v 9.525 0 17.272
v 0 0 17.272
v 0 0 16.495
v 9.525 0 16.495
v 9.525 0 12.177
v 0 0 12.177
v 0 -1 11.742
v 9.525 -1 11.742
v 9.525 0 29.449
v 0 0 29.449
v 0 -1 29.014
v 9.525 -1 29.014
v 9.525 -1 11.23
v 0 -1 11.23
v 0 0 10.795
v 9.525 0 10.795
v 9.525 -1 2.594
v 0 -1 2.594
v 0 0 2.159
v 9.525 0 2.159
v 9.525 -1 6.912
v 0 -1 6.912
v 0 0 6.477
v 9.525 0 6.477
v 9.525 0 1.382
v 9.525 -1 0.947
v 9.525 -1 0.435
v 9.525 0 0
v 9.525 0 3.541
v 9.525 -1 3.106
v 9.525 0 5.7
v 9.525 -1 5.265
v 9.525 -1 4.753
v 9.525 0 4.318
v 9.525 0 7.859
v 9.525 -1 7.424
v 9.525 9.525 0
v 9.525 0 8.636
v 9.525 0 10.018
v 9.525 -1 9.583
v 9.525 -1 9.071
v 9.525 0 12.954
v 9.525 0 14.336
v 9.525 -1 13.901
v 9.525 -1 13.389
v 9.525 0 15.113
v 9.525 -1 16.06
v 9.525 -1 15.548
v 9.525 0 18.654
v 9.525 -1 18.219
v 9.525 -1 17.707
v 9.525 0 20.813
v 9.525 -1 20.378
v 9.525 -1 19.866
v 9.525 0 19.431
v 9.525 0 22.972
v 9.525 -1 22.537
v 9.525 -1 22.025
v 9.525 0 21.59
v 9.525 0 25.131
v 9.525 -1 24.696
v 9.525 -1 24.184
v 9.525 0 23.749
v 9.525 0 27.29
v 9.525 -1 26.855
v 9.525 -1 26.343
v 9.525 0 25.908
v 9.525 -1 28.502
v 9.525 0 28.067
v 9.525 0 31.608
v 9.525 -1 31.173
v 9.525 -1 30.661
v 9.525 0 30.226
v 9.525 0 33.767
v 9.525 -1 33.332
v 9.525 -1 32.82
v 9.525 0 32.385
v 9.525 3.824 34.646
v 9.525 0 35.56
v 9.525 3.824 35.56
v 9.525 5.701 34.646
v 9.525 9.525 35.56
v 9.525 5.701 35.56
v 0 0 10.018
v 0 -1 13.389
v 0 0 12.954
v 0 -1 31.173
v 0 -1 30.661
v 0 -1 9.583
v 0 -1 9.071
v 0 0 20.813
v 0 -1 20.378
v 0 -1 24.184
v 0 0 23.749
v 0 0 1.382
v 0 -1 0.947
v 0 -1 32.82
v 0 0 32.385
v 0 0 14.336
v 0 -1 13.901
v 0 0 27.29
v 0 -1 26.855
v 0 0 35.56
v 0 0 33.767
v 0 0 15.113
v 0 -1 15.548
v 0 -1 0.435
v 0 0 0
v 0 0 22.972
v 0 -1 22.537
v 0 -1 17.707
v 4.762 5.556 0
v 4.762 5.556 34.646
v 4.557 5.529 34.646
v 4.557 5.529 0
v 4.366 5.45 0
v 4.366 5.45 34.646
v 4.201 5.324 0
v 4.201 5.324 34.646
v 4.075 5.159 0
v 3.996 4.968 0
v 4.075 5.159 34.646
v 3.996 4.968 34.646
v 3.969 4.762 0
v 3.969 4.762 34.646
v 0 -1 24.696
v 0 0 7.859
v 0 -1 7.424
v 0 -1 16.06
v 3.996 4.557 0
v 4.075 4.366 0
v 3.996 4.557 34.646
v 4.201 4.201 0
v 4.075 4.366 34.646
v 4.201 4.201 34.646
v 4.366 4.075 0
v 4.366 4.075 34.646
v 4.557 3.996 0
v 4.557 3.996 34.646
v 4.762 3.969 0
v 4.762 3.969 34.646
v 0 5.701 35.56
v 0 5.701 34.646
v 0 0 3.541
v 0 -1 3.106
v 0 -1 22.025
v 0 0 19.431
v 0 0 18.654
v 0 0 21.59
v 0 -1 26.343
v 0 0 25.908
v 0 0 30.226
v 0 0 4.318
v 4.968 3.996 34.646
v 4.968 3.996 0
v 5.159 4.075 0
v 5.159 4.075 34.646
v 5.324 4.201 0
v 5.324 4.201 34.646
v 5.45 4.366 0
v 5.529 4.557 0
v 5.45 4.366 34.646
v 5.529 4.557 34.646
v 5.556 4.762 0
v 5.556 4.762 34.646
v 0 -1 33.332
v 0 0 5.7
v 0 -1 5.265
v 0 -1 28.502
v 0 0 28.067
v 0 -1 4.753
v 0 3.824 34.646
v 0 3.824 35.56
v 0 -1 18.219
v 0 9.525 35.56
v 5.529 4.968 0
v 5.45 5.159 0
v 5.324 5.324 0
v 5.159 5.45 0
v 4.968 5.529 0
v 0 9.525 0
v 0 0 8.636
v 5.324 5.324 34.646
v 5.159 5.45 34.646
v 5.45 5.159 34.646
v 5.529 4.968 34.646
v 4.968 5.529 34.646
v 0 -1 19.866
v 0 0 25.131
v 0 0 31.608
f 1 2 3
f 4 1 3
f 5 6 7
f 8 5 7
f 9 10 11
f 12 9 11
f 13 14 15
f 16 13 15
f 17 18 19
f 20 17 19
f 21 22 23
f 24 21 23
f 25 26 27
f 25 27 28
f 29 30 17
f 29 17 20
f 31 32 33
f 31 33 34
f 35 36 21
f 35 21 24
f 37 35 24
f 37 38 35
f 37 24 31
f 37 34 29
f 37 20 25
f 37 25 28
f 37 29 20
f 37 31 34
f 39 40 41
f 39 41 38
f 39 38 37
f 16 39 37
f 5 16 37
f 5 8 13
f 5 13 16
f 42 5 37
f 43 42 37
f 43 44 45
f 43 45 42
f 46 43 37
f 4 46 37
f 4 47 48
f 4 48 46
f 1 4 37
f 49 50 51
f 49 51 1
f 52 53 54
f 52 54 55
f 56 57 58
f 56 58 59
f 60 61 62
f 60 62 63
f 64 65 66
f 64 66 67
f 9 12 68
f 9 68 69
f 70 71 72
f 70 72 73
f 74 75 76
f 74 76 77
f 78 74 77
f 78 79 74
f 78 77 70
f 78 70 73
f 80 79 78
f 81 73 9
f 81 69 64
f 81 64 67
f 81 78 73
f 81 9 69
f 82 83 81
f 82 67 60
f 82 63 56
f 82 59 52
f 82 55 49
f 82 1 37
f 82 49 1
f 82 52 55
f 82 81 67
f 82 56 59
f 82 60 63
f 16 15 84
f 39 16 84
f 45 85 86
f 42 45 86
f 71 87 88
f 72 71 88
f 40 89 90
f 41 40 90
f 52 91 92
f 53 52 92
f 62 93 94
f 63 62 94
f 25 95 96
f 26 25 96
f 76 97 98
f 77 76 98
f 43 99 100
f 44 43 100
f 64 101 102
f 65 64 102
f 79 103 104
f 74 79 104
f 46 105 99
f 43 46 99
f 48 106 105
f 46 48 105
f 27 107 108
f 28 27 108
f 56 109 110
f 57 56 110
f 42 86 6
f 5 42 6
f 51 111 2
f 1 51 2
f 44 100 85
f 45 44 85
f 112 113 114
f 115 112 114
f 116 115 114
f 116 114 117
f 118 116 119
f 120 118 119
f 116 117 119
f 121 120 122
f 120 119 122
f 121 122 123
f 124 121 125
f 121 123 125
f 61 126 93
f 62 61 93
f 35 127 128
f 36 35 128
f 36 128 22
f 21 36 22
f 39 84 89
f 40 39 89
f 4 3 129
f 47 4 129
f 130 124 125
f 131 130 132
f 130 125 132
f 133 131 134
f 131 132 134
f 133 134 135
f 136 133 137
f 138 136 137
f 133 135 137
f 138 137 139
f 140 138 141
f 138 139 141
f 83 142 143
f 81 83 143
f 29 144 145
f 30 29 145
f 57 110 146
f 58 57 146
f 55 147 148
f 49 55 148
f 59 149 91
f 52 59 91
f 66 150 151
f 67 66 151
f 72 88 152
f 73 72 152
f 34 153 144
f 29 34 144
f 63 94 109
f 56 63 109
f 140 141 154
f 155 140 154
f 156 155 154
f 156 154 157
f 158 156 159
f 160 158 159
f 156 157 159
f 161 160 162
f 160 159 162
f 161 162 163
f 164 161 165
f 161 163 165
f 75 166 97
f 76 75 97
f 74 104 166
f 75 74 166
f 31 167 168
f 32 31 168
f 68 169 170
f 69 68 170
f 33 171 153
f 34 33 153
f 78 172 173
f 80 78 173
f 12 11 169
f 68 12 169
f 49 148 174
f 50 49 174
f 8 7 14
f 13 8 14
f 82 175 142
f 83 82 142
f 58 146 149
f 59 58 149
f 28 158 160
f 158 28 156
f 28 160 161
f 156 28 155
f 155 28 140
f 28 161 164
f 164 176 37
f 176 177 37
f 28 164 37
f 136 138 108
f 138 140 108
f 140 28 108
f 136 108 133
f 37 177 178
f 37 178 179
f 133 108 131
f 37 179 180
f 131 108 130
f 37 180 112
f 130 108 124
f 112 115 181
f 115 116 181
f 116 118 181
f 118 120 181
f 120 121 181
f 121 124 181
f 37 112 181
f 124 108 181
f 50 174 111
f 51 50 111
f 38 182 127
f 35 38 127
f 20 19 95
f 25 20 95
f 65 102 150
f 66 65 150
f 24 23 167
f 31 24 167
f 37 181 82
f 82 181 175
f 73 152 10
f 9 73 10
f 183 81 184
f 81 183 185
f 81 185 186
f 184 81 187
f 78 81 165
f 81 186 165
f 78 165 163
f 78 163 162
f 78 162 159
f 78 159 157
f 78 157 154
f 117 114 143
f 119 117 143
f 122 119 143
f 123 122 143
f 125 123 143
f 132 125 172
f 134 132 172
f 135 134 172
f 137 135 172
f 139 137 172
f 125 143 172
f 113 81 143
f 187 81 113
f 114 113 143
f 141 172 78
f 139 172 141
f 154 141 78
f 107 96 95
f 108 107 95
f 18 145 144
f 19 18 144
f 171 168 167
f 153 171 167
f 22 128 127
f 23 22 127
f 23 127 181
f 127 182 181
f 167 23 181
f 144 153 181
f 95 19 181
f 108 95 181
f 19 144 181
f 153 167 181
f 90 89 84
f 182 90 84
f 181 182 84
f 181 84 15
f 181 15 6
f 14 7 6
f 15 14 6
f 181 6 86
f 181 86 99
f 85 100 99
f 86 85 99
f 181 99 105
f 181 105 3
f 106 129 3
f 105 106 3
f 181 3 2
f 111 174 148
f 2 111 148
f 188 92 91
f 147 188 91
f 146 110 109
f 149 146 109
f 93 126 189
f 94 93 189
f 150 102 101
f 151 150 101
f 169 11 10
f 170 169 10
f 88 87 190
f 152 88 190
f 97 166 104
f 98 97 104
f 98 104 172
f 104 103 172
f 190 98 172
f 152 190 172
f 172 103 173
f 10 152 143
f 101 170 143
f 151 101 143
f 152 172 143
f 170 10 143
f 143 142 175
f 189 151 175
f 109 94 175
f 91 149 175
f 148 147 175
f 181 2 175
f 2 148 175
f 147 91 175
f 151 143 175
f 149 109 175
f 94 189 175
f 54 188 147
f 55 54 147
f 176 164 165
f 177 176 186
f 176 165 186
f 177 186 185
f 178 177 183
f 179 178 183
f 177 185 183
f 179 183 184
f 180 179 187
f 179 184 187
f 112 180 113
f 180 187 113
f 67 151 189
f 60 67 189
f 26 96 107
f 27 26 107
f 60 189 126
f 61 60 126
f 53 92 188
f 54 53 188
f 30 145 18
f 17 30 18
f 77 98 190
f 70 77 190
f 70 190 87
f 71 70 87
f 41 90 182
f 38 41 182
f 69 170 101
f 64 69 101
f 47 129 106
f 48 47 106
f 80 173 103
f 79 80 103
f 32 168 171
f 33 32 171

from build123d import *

# Parameters (mm, degrees)
F1_DEPTH = 9.525
F3_DEPTH = 34.6458181739


# Not quite as in the source:
# - a feature names something its author has since deleted; it is built from what else it names


with BuildPart() as f1:
    # F0 (on Right) → F1 (new body)
    with BuildSketch(Plane.YZ):
        Polygon((0, 1.3819878222), (0, 0), (9.525, 0), (9.525, 35.56), (5.7011166342, 35.56), (5.7011166342, 34.6458181739), (4.7625, 34.6458181739), (3.8238833658, 34.6458181739), (3.8238833658, 35.56), (0, 35.56), (0, 33.7669878222), (0, 32.385), (0, 31.6079878222), (0, 30.226), (0, 29.4489878222), (0, 28.067), (0, 27.2899878222), (0, 25.908), (0, 25.1309878222), (0, 23.749), (0, 22.9719878222), (0, 21.59), (0, 20.8129878222), (0, 19.431), (0, 18.6539878222), (0, 17.272), (0, 16.4949878222), (0, 15.113), (0, 14.3359878222), (0, 12.954), (0, 12.1769878222), (0, 10.795), (0, 10.0179878222), (0, 8.636), (0, 7.8589878222), (0, 6.477), (0, 5.6999878222), (0, 4.318), (0, 3.5409878222), (0, 2.159), align=None)
        Polygon((-1.00000054, 0.4354505218), (0, 0), (0, 1.3819878222), (-1.00000054, 0.9465373005), (-1.00000054, 0.6909939111), align=None)
        Polygon((-1.00000054, 2.5944505218), (0, 2.159), (0, 3.5409878222), (-1.00000054, 3.1055373005), (-1.00000054, 2.8499939111), align=None)
        Polygon((-1.00000054, 4.7534505218), (0, 4.318), (0, 5.6999878222), (-1.00000054, 5.2645373005), (-1.00000054, 5.0089939111), align=None)
        Polygon((-1.00000054, 6.9124505218), (0, 6.477), (0, 7.8589878222), (-1.00000054, 7.4235373005), (-1.00000054, 7.1679939111), align=None)
        Polygon((-1.00000054, 9.0714505218), (0, 8.636), (0, 10.0179878222), (-1.00000054, 9.5825373005), (-1.00000054, 9.3269939111), align=None)
        Polygon((-1.00000054, 11.2304505218), (0, 10.795), (0, 12.1769878222), (-1.00000054, 11.7415373005), (-1.00000054, 11.4859939111), align=None)
        Polygon((-1.00000054, 13.3894505218), (0, 12.954), (0, 14.3359878222), (-1.00000054, 13.9005373005), (-1.00000054, 13.6449939111), align=None)
        Polygon((-1.00000054, 15.5484505218), (0, 15.113), (0, 16.4949878222), (-1.00000054, 16.0595373005), (-1.00000054, 15.8039939111), align=None)
        Polygon((-1.00000054, 17.7074505218), (0, 17.272), (0, 18.6539878222), (-1.00000054, 18.2185373005), (-1.00000054, 17.9629939111), align=None)
        Polygon((-1.00000054, 19.8664505218), (0, 19.431), (0, 20.8129878222), (-1.00000054, 20.3775373005), (-1.00000054, 20.1219939111), align=None)
        Polygon((0, 21.59), (0, 22.9719878222), (-1.00000054, 22.5365373005), (-1.00000054, 22.2809939111), (-1.00000054, 22.0254505218), align=None)
        Polygon((0, 23.749), (0, 25.1309878222), (-1.00000054, 24.6955373005), (-1.00000054, 24.4399939111), (-1.00000054, 24.1844505218), align=None)
        Polygon((0, 25.908), (0, 27.2899878222), (-1.00000054, 26.8545373005), (-1.00000054, 26.5989939111), (-1.00000054, 26.3434505218), align=None)
        Polygon((0, 28.067), (0, 29.4489878222), (-1.00000054, 29.0135373005), (-1.00000054, 28.7579939111), (-1.00000054, 28.5024505218), align=None)
        Polygon((0, 30.226), (0, 31.6079878222), (-1.00000054, 31.1725373005), (-1.00000054, 30.9169939111), (-1.00000054, 30.6614505218), align=None)
        Polygon((0, 32.385), (0, 33.7669878222), (-1.00000054, 33.3315373005), (-1.00000054, 33.0759939111), (-1.00000054, 32.8204505218), align=None)
    extrude(amount=F1_DEPTH)

    # F2 (on face) → F3 (cut, through all)
    with BuildSketch(Plane.XY.offset(34.6458181739)):
        with BuildLine():
            Line((4.7625, 3.96875), (4.7625, 4.7625))
            Line((4.7625, 4.7625), (3.96875, 4.7625))
            ThreePointArc((3.96875, 4.7625), (4.2012339924, 4.2012339924), (4.7625, 3.96875))
        make_face()
        with BuildLine():
            Line((3.96875, 4.7625), (4.7625, 4.7625))
            Line((4.7625, 4.7625), (4.7625, 5.55625))
            ThreePointArc((4.7625, 5.55625), (4.2012339924, 5.3237660076), (3.96875, 4.7625))
        make_face()
        with BuildLine():
            ThreePointArc((4.7625, 3.96875), (5.3237660076, 4.2012339924), (5.55625, 4.7625))
            Line((5.55625, 4.7625), (4.7625, 4.7625))
            Line((4.7625, 4.7625), (4.7625, 3.96875))
        make_face()
        with BuildLine():
            Line((4.7625, 4.7625), (5.55625, 4.7625))
            ThreePointArc((5.55625, 4.7625), (5.3237660076, 5.3237660076), (4.7625, 5.55625))
            Line((4.7625, 5.55625), (4.7625, 4.7625))
        make_face()
    extrude(amount=-F3_DEPTH, mode=Mode.SUBTRACT)


solid = f1.part
